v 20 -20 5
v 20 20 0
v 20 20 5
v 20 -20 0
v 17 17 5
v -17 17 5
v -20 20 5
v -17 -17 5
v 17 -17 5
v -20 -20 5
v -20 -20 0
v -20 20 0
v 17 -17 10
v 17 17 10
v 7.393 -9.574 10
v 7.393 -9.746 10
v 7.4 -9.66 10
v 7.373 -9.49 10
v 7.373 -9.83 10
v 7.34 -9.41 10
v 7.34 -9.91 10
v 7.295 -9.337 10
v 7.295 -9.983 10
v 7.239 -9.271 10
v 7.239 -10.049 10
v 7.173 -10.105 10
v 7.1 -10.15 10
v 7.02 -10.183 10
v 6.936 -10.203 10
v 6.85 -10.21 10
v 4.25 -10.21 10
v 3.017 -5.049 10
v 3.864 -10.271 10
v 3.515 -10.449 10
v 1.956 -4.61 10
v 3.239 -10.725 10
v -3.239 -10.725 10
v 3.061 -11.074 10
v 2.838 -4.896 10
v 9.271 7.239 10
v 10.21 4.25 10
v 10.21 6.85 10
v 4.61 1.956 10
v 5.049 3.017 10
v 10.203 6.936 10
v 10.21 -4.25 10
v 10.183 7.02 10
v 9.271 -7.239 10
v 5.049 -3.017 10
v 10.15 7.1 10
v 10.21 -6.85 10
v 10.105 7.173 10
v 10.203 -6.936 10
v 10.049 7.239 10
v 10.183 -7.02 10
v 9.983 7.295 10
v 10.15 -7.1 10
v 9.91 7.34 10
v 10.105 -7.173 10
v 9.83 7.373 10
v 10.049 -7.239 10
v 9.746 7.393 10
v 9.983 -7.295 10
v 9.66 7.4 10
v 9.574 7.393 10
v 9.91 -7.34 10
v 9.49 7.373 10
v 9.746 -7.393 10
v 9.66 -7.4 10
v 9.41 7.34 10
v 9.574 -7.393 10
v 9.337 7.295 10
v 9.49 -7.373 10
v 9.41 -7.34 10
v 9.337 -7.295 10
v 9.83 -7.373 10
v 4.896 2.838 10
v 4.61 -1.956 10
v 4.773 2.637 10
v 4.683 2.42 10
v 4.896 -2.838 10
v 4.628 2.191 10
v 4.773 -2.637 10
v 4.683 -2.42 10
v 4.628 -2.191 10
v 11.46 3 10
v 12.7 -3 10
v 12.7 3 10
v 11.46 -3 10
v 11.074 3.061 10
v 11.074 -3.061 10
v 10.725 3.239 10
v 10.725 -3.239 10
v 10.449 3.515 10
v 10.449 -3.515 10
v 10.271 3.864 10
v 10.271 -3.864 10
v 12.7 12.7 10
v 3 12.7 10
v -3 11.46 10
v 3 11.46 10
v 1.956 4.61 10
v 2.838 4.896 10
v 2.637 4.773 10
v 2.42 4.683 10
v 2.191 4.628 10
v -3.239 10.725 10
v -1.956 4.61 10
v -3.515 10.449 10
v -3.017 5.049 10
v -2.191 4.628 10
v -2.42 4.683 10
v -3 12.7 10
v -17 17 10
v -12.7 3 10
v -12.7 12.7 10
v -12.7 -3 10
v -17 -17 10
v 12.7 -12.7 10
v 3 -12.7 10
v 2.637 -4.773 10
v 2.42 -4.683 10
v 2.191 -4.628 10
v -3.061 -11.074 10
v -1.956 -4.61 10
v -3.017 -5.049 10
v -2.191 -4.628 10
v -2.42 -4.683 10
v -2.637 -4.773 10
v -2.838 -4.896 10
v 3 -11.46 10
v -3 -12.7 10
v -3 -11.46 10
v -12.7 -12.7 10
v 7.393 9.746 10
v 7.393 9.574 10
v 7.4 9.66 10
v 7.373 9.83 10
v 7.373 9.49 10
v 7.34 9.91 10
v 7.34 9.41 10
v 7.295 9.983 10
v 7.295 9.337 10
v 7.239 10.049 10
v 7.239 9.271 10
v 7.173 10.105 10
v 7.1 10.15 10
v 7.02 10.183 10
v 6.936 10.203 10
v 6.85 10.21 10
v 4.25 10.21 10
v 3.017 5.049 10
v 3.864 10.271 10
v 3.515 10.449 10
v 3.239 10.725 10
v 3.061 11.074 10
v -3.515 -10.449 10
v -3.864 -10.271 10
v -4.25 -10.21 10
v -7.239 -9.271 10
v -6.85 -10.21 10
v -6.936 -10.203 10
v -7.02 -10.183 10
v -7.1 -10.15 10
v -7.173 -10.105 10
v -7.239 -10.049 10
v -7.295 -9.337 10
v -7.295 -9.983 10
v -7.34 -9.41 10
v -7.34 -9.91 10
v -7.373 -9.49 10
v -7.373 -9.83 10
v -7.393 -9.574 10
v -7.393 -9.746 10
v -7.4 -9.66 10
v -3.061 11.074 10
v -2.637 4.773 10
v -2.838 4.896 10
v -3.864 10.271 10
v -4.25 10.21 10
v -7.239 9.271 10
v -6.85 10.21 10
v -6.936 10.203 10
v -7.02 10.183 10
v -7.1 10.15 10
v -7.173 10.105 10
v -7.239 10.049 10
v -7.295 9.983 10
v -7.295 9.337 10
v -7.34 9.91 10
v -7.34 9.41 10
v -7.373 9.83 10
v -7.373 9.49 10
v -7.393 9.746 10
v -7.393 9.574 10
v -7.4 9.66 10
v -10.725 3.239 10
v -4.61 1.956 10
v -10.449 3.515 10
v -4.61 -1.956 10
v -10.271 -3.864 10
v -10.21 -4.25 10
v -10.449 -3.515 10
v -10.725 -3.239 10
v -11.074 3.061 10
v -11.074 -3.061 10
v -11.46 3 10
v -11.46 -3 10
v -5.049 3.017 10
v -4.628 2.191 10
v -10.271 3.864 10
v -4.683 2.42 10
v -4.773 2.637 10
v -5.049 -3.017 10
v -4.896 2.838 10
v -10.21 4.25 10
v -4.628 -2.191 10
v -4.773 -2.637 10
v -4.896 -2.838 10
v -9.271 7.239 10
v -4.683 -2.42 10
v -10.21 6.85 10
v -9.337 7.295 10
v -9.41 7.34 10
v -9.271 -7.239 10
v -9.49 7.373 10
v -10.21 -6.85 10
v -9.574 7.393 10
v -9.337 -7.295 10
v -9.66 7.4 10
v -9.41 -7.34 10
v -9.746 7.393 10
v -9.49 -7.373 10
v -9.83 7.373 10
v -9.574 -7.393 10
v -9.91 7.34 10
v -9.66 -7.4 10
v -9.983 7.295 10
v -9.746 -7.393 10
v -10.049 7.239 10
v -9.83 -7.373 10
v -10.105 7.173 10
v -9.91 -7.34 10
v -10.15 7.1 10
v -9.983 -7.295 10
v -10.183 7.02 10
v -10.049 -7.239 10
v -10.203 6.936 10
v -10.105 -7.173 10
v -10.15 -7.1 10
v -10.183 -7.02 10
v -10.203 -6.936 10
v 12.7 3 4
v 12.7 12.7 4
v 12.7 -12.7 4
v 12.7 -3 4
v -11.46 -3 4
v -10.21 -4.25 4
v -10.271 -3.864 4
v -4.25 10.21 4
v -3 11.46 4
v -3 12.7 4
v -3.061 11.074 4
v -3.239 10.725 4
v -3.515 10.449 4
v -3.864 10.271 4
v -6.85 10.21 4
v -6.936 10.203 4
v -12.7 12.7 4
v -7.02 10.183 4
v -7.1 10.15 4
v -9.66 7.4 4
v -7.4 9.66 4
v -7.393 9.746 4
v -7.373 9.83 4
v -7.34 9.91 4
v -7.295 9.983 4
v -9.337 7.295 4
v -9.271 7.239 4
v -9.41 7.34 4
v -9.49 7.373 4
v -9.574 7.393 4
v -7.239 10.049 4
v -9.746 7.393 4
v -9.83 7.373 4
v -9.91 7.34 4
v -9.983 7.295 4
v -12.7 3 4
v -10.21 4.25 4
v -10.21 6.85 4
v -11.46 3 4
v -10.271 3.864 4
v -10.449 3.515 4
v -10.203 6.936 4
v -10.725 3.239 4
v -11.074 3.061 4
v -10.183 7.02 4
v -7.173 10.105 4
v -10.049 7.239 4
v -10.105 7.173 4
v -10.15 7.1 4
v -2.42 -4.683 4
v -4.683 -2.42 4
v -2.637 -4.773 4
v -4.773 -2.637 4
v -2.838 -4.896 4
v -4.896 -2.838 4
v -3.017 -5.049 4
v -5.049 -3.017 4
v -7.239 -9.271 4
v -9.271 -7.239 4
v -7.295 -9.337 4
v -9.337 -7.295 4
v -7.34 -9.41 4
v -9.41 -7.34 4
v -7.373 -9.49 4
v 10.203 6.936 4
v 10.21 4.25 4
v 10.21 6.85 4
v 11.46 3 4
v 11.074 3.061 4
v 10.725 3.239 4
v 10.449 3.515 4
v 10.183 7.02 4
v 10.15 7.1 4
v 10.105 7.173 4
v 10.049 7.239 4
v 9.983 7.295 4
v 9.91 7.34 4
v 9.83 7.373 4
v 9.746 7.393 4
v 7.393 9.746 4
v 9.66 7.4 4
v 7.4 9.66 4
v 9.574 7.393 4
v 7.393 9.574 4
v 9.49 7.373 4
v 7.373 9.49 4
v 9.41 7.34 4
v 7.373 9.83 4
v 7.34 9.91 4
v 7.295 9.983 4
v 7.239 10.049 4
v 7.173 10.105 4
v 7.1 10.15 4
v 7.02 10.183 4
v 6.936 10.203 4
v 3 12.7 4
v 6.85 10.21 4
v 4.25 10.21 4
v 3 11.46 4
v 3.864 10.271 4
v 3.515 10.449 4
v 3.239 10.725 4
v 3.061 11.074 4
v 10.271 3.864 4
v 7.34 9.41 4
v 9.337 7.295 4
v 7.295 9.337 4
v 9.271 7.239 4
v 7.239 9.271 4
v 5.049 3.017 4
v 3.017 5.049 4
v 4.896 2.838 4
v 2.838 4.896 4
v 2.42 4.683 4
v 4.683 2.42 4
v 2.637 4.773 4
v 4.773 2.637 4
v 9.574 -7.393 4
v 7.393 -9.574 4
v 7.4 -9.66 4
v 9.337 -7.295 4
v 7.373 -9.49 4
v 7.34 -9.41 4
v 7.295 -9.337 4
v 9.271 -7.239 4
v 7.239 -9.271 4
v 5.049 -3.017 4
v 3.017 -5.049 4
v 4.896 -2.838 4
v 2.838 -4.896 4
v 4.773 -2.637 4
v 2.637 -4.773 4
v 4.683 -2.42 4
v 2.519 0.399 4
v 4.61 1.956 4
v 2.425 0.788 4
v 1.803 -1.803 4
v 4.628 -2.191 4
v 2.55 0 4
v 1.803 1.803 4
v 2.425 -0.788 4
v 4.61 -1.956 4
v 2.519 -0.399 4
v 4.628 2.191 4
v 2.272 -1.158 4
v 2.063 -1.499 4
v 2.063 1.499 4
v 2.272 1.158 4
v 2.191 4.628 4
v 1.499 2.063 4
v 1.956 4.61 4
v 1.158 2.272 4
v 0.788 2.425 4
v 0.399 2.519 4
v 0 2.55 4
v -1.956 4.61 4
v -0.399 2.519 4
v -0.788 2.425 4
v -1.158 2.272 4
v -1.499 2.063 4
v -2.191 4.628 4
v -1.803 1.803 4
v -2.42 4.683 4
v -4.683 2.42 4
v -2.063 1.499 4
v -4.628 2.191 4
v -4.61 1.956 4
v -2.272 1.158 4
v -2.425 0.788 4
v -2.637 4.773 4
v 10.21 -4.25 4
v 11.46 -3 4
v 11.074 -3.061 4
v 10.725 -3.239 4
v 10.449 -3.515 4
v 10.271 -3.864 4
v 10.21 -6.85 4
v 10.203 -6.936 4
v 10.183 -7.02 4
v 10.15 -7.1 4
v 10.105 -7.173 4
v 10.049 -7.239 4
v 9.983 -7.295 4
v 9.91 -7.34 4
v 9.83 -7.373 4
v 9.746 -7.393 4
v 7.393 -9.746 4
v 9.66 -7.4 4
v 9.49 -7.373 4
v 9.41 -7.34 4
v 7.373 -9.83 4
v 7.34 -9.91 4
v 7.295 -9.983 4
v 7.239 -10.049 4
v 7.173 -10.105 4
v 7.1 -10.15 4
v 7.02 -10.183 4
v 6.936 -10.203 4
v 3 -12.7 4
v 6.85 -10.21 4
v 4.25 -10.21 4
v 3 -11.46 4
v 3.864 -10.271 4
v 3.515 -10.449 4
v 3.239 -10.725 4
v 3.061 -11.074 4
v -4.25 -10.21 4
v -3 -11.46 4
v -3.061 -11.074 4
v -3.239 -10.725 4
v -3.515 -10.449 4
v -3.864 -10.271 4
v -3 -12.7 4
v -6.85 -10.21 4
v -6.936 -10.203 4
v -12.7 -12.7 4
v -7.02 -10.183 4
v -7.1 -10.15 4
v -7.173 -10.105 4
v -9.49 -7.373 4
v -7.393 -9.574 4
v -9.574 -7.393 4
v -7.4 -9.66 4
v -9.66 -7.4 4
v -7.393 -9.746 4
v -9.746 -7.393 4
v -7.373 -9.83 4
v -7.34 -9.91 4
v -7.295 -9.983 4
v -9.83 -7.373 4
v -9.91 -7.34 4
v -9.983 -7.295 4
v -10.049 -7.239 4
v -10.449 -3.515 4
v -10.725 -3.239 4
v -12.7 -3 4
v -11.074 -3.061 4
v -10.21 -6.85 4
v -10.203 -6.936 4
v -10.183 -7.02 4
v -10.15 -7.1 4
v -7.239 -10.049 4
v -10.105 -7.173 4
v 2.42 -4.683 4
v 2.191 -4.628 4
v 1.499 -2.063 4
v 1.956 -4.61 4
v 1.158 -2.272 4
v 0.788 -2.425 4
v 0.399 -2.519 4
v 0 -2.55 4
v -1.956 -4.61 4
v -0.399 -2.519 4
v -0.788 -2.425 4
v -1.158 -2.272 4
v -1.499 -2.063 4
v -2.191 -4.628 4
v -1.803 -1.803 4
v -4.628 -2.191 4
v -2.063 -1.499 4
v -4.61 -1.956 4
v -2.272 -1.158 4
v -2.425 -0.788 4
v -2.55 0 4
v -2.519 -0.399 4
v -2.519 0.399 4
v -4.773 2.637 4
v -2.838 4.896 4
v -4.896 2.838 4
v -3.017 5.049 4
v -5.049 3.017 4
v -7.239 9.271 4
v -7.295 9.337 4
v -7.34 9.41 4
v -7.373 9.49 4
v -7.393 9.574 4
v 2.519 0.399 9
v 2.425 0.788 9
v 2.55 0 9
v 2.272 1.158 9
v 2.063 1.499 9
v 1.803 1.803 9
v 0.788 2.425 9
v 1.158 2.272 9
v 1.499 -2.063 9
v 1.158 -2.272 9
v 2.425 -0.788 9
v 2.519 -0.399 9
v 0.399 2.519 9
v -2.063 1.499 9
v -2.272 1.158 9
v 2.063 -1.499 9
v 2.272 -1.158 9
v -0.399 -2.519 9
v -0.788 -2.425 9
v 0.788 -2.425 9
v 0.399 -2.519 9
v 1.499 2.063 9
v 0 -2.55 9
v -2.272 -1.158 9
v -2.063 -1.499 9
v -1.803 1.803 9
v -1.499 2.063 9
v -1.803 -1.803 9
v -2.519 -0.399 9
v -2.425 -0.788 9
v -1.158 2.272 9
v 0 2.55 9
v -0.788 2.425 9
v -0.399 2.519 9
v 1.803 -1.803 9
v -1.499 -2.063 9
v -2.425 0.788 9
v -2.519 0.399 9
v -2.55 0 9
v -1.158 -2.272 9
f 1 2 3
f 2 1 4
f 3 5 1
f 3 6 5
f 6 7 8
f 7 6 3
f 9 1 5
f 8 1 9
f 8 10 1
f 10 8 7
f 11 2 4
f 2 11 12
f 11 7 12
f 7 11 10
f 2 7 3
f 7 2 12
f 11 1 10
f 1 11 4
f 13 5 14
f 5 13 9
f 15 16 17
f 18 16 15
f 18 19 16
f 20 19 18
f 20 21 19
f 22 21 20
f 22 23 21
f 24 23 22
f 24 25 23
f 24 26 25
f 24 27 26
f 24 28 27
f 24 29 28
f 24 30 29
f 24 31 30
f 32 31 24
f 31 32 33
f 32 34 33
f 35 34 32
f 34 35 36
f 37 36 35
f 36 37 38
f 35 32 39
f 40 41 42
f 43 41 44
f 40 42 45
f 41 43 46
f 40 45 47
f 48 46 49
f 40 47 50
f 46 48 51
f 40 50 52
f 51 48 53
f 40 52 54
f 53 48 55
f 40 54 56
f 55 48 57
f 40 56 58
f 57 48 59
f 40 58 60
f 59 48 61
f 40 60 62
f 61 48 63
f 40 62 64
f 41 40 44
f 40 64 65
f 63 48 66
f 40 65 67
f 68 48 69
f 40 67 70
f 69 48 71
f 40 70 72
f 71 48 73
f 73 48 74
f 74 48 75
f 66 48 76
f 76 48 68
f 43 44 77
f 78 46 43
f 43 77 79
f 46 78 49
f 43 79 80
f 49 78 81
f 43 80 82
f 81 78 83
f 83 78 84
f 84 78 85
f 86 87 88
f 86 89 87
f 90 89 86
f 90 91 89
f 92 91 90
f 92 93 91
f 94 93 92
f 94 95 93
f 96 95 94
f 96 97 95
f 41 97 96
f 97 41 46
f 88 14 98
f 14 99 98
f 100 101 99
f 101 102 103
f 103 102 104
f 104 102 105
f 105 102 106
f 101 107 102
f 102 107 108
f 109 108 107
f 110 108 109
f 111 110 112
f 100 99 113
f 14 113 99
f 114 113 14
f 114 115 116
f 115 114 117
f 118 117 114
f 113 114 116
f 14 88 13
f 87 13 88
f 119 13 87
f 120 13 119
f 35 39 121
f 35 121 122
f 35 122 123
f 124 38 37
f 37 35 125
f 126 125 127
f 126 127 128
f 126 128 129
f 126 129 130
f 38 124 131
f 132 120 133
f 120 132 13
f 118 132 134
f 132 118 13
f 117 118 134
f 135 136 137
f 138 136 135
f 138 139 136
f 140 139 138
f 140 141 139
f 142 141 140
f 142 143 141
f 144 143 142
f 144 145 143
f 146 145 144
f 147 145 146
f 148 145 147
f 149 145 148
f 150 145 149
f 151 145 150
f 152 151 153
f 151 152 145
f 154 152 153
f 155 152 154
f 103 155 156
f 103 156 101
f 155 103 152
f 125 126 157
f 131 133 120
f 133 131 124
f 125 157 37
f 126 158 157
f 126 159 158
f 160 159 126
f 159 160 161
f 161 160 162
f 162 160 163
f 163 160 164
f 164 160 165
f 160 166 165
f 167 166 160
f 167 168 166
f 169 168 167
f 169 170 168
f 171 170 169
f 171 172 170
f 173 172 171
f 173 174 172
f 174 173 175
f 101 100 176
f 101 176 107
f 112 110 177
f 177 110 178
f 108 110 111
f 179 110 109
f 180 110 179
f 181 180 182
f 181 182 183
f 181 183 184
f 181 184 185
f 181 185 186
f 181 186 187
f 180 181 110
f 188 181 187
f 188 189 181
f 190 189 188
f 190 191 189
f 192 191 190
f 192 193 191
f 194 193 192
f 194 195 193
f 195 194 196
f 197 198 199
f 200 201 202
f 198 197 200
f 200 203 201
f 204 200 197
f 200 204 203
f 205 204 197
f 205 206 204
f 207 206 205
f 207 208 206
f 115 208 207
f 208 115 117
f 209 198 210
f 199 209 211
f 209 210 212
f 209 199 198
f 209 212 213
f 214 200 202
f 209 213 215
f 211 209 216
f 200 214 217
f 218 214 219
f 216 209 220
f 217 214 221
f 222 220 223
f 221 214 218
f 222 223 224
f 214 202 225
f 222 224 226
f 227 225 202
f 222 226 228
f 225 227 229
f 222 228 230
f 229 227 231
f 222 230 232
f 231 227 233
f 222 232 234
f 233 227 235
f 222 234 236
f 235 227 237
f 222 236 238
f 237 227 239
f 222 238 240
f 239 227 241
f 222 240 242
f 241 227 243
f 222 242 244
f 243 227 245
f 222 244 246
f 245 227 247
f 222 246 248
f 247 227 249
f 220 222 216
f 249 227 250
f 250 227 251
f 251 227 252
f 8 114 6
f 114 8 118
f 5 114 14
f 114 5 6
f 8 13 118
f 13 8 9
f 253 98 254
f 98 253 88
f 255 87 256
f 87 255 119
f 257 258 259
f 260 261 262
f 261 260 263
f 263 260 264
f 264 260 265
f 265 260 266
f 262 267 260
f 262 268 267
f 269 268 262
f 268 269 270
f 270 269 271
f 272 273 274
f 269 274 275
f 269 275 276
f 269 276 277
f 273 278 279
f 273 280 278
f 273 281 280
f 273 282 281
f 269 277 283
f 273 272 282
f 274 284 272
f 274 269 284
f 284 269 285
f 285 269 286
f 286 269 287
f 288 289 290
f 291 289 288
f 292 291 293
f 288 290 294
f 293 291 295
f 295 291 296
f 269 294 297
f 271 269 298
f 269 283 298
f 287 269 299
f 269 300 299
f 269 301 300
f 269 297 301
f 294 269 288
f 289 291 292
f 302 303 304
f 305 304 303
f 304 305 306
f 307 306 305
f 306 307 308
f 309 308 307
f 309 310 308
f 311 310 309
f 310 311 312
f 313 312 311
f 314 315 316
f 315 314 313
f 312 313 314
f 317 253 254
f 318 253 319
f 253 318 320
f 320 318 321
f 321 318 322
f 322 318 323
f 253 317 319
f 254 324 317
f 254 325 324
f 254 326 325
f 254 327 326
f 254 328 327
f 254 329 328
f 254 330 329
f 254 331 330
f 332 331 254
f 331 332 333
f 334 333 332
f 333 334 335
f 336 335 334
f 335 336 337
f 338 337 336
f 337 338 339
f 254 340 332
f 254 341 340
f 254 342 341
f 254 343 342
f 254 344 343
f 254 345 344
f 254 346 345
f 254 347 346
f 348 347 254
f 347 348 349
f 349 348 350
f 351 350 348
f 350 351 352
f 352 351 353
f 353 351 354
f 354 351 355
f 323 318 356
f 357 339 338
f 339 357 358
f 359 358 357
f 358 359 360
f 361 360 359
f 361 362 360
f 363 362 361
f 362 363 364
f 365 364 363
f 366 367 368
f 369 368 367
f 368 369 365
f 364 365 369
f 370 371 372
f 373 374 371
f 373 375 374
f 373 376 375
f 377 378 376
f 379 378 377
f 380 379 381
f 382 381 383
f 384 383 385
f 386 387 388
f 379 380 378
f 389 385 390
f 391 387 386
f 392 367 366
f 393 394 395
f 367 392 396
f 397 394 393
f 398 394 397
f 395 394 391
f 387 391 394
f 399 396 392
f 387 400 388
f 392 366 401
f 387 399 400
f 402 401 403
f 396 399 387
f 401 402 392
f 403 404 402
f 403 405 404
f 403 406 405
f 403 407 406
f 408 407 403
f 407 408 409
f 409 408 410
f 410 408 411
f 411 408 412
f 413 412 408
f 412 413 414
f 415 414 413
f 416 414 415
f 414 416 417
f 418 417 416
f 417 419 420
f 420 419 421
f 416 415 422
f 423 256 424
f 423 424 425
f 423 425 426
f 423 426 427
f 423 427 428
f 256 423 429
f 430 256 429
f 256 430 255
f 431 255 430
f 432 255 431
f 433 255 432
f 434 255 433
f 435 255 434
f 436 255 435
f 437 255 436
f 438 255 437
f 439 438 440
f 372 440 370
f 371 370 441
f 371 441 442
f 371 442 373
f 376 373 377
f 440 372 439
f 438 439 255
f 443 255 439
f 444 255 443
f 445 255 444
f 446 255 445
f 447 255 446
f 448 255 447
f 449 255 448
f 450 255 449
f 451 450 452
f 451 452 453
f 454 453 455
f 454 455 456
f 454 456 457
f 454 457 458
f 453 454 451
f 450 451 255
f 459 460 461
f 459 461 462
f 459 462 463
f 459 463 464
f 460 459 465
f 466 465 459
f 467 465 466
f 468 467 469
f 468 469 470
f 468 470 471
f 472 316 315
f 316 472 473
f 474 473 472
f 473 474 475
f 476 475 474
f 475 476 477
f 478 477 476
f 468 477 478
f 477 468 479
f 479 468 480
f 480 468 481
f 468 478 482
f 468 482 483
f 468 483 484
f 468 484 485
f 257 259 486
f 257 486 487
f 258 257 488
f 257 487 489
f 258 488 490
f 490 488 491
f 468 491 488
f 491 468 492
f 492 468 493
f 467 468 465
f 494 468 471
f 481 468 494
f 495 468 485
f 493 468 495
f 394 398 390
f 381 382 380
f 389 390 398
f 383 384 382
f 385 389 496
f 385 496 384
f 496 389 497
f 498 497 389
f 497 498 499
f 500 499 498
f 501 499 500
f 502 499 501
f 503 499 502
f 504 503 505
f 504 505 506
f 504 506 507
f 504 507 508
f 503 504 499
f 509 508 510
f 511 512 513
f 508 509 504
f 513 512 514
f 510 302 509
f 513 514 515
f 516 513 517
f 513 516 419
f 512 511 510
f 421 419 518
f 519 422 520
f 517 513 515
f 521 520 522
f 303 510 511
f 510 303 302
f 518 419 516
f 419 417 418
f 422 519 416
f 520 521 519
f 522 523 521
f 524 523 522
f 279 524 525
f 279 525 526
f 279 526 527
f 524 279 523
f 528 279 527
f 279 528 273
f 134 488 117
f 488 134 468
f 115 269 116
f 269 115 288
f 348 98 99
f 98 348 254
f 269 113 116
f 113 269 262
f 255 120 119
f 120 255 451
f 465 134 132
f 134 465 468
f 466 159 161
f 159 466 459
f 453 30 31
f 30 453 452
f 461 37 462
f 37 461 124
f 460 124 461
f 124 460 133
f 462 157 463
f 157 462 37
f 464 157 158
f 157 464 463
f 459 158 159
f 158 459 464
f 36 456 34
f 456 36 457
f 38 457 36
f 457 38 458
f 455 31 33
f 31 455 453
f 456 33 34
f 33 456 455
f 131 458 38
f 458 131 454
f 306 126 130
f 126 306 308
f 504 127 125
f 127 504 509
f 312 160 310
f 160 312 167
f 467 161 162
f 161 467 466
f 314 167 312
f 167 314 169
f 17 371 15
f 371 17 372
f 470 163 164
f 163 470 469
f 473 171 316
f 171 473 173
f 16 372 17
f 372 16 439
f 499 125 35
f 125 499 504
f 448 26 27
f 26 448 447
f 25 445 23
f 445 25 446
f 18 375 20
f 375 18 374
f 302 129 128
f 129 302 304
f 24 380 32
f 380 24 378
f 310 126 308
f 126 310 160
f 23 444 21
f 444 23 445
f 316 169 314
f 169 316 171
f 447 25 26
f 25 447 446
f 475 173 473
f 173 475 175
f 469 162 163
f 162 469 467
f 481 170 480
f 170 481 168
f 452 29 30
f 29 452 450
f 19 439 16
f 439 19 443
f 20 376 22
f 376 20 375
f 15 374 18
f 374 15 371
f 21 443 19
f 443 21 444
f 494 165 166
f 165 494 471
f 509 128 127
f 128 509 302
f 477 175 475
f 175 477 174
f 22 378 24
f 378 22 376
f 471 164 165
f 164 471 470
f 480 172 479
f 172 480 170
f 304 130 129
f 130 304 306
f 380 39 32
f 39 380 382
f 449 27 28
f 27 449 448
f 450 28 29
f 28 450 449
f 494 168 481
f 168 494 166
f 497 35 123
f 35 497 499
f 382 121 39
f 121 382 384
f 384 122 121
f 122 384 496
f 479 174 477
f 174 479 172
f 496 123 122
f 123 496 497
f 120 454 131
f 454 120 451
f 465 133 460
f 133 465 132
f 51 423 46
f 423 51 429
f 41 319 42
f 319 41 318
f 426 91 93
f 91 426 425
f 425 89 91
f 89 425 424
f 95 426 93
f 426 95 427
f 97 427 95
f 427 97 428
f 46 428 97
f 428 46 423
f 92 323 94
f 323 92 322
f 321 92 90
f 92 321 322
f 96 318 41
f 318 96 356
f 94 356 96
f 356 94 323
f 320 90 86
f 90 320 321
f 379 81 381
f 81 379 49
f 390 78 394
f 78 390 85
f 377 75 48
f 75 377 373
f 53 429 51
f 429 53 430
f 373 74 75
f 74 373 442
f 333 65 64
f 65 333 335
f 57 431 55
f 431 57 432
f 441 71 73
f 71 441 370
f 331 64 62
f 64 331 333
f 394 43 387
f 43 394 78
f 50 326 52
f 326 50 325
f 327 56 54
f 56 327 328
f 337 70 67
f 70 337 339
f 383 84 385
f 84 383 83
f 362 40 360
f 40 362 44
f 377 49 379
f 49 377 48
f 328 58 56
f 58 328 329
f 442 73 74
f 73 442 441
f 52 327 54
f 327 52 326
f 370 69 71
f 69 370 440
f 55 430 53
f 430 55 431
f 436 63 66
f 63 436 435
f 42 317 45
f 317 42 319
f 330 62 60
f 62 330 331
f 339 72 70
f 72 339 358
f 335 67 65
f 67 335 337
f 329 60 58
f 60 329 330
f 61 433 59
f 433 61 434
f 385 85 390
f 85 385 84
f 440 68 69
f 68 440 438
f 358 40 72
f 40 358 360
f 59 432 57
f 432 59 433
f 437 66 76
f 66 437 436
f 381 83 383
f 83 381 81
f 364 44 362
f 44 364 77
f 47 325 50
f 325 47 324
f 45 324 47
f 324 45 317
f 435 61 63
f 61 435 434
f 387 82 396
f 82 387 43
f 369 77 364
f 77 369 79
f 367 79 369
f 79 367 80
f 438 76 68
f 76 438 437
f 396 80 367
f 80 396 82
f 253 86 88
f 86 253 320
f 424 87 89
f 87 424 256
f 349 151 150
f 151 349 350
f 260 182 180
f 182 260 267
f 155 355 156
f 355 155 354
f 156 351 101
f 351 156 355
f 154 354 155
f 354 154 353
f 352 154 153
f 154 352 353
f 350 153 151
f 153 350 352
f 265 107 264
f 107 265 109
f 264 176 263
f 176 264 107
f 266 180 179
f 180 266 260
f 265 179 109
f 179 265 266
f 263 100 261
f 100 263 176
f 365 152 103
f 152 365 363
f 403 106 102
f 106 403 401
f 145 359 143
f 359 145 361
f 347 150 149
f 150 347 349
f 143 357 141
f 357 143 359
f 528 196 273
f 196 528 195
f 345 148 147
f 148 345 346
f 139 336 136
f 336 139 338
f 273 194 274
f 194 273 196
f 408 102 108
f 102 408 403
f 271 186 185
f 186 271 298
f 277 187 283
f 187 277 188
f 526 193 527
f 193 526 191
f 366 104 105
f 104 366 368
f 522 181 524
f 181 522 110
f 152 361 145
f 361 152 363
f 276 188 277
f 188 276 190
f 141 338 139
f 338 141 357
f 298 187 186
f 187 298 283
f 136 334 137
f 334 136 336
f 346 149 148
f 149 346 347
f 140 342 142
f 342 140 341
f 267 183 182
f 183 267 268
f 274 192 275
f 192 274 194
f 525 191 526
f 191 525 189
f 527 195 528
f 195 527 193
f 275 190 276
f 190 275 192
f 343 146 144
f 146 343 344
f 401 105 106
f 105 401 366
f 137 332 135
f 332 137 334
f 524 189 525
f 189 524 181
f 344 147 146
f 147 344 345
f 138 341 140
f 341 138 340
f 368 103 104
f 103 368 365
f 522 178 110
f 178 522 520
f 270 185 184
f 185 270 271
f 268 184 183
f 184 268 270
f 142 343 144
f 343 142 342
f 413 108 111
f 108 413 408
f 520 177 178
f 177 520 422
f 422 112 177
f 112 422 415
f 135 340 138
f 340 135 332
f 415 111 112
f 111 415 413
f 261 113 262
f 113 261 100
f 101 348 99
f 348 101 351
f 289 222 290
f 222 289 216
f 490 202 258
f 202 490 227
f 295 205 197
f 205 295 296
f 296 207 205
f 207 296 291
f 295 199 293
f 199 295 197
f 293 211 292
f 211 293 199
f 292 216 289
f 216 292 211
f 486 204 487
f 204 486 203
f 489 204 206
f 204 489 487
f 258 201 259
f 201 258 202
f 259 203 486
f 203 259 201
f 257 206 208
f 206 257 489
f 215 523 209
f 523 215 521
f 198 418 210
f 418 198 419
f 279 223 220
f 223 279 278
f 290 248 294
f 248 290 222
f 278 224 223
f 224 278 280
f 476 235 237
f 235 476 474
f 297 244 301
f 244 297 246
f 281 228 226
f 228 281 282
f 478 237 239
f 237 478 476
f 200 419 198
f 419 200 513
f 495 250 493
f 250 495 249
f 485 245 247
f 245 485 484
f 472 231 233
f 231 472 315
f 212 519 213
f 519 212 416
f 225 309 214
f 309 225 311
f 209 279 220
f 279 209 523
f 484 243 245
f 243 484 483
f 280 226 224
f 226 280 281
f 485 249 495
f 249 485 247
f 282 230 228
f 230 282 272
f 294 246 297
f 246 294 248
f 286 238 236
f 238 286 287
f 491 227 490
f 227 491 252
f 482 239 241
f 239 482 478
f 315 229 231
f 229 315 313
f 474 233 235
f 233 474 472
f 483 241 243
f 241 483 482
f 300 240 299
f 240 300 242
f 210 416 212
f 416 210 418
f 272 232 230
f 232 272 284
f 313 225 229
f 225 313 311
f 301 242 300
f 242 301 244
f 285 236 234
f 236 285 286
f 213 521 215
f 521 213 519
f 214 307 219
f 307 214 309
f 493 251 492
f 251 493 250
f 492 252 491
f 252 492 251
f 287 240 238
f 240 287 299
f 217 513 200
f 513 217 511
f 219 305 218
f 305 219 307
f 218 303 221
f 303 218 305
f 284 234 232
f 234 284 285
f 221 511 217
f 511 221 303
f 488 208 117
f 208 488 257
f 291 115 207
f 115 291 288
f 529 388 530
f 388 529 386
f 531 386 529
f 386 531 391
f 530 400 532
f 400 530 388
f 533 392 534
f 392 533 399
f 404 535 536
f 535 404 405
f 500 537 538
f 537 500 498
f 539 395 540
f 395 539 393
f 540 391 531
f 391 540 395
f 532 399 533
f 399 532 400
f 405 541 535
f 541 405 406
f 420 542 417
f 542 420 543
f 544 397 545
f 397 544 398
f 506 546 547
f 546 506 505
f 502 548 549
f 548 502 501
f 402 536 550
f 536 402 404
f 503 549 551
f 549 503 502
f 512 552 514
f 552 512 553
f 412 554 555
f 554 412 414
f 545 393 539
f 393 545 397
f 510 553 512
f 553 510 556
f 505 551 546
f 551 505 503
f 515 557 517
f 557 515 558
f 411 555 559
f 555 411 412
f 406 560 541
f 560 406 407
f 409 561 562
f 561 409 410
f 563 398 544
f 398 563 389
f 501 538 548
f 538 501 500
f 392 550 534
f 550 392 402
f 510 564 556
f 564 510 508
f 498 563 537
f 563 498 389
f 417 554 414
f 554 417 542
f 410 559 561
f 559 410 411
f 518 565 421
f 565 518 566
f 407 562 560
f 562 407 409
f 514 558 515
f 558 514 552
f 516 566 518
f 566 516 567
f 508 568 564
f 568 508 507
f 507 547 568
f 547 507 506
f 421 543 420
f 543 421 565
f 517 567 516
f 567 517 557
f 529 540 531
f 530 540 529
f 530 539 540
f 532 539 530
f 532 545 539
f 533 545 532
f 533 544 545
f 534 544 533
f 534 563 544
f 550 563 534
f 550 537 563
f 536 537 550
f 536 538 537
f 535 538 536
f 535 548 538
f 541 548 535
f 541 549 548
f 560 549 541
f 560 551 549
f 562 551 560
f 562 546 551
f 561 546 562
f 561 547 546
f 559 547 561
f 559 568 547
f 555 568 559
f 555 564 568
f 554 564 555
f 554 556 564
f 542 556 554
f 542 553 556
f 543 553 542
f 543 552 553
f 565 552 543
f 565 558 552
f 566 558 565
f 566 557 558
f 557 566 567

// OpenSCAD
h0 = 5;
h1 = 10;
difference() {
  union(){
    translate([-20,-20,0])cube([40,40,h0]);
    translate([-17,-17,0])cube([34,34,h1]);
  }
  translate([-12.7,-12.7,h0-1])cube([25.4,25.4,h1]);
}
for(i=[0:3]) rotate([0,0,i*90]) translate([0,-12.7-0.01,0]) t_slot_C(h1);
translate([0,0,h0-1]) cylinder(h=h0,d=5.1,$fn=40);
module v_slot_C(height1) {
x1=4.5;
x2=3.1;
x3=5.4;
x4=2.9;
y1=1.9;
y2=3.5;
y3=6;

linear_extrude(height = height1, convexity = 10, slices = 20, scale = 1.0)
polygon(points=[[-x1,0],[-x2,y1],[-x3,y1],[-x3,y2],[-x4,y3],[x4,y3],[x3,y2], [x3,y1],[x2,y1],[x1,0]],convexity=10);
}



module t_slot_C(height1) {

    d1 = 1.1;
    x1=7.4 - d1/2;
    y1=2.5+d1/2;

    d2 = 3;
    y2=8.1-d2/2;
    x2=x1-(y2-y1)-(d2-d1)/sqrt(2);


    x3 = 6;
    d3 = y1-d1/2;

    hull(){
     translate([-x1,y1,height1/2]) cylinder(h=height1,d=d1,$fn=40,center=true);
     translate([x1,y1,height1/2]) cylinder(h=height1,d=d1,$fn=40,center=true);
     translate([-x2,y2,height1/2]) cylinder(h=height1,d=d2,$fn=40,center=true);
     translate([x2,y2,height1/2]) cylinder(h=height1,d=d2,$fn=40,center=true);
    }

    translate([-x3/2,0,0])cube([x3,y1,height1]);

    difference(){
        translate([-x3/2-d3/2,d3/2,0])cube([x3+d3,d3/2,height1]);
        translate([-x3/2-d3/2,d3/2,height1/2]) cylinder(h=height1+.1,d=d3,$fn=20,center=true);
        translate([x3/2+d3/2,d3/2,height1/2]) cylinder(h=height1+.1,d=d3,$fn=20,center=true);
    }
}
